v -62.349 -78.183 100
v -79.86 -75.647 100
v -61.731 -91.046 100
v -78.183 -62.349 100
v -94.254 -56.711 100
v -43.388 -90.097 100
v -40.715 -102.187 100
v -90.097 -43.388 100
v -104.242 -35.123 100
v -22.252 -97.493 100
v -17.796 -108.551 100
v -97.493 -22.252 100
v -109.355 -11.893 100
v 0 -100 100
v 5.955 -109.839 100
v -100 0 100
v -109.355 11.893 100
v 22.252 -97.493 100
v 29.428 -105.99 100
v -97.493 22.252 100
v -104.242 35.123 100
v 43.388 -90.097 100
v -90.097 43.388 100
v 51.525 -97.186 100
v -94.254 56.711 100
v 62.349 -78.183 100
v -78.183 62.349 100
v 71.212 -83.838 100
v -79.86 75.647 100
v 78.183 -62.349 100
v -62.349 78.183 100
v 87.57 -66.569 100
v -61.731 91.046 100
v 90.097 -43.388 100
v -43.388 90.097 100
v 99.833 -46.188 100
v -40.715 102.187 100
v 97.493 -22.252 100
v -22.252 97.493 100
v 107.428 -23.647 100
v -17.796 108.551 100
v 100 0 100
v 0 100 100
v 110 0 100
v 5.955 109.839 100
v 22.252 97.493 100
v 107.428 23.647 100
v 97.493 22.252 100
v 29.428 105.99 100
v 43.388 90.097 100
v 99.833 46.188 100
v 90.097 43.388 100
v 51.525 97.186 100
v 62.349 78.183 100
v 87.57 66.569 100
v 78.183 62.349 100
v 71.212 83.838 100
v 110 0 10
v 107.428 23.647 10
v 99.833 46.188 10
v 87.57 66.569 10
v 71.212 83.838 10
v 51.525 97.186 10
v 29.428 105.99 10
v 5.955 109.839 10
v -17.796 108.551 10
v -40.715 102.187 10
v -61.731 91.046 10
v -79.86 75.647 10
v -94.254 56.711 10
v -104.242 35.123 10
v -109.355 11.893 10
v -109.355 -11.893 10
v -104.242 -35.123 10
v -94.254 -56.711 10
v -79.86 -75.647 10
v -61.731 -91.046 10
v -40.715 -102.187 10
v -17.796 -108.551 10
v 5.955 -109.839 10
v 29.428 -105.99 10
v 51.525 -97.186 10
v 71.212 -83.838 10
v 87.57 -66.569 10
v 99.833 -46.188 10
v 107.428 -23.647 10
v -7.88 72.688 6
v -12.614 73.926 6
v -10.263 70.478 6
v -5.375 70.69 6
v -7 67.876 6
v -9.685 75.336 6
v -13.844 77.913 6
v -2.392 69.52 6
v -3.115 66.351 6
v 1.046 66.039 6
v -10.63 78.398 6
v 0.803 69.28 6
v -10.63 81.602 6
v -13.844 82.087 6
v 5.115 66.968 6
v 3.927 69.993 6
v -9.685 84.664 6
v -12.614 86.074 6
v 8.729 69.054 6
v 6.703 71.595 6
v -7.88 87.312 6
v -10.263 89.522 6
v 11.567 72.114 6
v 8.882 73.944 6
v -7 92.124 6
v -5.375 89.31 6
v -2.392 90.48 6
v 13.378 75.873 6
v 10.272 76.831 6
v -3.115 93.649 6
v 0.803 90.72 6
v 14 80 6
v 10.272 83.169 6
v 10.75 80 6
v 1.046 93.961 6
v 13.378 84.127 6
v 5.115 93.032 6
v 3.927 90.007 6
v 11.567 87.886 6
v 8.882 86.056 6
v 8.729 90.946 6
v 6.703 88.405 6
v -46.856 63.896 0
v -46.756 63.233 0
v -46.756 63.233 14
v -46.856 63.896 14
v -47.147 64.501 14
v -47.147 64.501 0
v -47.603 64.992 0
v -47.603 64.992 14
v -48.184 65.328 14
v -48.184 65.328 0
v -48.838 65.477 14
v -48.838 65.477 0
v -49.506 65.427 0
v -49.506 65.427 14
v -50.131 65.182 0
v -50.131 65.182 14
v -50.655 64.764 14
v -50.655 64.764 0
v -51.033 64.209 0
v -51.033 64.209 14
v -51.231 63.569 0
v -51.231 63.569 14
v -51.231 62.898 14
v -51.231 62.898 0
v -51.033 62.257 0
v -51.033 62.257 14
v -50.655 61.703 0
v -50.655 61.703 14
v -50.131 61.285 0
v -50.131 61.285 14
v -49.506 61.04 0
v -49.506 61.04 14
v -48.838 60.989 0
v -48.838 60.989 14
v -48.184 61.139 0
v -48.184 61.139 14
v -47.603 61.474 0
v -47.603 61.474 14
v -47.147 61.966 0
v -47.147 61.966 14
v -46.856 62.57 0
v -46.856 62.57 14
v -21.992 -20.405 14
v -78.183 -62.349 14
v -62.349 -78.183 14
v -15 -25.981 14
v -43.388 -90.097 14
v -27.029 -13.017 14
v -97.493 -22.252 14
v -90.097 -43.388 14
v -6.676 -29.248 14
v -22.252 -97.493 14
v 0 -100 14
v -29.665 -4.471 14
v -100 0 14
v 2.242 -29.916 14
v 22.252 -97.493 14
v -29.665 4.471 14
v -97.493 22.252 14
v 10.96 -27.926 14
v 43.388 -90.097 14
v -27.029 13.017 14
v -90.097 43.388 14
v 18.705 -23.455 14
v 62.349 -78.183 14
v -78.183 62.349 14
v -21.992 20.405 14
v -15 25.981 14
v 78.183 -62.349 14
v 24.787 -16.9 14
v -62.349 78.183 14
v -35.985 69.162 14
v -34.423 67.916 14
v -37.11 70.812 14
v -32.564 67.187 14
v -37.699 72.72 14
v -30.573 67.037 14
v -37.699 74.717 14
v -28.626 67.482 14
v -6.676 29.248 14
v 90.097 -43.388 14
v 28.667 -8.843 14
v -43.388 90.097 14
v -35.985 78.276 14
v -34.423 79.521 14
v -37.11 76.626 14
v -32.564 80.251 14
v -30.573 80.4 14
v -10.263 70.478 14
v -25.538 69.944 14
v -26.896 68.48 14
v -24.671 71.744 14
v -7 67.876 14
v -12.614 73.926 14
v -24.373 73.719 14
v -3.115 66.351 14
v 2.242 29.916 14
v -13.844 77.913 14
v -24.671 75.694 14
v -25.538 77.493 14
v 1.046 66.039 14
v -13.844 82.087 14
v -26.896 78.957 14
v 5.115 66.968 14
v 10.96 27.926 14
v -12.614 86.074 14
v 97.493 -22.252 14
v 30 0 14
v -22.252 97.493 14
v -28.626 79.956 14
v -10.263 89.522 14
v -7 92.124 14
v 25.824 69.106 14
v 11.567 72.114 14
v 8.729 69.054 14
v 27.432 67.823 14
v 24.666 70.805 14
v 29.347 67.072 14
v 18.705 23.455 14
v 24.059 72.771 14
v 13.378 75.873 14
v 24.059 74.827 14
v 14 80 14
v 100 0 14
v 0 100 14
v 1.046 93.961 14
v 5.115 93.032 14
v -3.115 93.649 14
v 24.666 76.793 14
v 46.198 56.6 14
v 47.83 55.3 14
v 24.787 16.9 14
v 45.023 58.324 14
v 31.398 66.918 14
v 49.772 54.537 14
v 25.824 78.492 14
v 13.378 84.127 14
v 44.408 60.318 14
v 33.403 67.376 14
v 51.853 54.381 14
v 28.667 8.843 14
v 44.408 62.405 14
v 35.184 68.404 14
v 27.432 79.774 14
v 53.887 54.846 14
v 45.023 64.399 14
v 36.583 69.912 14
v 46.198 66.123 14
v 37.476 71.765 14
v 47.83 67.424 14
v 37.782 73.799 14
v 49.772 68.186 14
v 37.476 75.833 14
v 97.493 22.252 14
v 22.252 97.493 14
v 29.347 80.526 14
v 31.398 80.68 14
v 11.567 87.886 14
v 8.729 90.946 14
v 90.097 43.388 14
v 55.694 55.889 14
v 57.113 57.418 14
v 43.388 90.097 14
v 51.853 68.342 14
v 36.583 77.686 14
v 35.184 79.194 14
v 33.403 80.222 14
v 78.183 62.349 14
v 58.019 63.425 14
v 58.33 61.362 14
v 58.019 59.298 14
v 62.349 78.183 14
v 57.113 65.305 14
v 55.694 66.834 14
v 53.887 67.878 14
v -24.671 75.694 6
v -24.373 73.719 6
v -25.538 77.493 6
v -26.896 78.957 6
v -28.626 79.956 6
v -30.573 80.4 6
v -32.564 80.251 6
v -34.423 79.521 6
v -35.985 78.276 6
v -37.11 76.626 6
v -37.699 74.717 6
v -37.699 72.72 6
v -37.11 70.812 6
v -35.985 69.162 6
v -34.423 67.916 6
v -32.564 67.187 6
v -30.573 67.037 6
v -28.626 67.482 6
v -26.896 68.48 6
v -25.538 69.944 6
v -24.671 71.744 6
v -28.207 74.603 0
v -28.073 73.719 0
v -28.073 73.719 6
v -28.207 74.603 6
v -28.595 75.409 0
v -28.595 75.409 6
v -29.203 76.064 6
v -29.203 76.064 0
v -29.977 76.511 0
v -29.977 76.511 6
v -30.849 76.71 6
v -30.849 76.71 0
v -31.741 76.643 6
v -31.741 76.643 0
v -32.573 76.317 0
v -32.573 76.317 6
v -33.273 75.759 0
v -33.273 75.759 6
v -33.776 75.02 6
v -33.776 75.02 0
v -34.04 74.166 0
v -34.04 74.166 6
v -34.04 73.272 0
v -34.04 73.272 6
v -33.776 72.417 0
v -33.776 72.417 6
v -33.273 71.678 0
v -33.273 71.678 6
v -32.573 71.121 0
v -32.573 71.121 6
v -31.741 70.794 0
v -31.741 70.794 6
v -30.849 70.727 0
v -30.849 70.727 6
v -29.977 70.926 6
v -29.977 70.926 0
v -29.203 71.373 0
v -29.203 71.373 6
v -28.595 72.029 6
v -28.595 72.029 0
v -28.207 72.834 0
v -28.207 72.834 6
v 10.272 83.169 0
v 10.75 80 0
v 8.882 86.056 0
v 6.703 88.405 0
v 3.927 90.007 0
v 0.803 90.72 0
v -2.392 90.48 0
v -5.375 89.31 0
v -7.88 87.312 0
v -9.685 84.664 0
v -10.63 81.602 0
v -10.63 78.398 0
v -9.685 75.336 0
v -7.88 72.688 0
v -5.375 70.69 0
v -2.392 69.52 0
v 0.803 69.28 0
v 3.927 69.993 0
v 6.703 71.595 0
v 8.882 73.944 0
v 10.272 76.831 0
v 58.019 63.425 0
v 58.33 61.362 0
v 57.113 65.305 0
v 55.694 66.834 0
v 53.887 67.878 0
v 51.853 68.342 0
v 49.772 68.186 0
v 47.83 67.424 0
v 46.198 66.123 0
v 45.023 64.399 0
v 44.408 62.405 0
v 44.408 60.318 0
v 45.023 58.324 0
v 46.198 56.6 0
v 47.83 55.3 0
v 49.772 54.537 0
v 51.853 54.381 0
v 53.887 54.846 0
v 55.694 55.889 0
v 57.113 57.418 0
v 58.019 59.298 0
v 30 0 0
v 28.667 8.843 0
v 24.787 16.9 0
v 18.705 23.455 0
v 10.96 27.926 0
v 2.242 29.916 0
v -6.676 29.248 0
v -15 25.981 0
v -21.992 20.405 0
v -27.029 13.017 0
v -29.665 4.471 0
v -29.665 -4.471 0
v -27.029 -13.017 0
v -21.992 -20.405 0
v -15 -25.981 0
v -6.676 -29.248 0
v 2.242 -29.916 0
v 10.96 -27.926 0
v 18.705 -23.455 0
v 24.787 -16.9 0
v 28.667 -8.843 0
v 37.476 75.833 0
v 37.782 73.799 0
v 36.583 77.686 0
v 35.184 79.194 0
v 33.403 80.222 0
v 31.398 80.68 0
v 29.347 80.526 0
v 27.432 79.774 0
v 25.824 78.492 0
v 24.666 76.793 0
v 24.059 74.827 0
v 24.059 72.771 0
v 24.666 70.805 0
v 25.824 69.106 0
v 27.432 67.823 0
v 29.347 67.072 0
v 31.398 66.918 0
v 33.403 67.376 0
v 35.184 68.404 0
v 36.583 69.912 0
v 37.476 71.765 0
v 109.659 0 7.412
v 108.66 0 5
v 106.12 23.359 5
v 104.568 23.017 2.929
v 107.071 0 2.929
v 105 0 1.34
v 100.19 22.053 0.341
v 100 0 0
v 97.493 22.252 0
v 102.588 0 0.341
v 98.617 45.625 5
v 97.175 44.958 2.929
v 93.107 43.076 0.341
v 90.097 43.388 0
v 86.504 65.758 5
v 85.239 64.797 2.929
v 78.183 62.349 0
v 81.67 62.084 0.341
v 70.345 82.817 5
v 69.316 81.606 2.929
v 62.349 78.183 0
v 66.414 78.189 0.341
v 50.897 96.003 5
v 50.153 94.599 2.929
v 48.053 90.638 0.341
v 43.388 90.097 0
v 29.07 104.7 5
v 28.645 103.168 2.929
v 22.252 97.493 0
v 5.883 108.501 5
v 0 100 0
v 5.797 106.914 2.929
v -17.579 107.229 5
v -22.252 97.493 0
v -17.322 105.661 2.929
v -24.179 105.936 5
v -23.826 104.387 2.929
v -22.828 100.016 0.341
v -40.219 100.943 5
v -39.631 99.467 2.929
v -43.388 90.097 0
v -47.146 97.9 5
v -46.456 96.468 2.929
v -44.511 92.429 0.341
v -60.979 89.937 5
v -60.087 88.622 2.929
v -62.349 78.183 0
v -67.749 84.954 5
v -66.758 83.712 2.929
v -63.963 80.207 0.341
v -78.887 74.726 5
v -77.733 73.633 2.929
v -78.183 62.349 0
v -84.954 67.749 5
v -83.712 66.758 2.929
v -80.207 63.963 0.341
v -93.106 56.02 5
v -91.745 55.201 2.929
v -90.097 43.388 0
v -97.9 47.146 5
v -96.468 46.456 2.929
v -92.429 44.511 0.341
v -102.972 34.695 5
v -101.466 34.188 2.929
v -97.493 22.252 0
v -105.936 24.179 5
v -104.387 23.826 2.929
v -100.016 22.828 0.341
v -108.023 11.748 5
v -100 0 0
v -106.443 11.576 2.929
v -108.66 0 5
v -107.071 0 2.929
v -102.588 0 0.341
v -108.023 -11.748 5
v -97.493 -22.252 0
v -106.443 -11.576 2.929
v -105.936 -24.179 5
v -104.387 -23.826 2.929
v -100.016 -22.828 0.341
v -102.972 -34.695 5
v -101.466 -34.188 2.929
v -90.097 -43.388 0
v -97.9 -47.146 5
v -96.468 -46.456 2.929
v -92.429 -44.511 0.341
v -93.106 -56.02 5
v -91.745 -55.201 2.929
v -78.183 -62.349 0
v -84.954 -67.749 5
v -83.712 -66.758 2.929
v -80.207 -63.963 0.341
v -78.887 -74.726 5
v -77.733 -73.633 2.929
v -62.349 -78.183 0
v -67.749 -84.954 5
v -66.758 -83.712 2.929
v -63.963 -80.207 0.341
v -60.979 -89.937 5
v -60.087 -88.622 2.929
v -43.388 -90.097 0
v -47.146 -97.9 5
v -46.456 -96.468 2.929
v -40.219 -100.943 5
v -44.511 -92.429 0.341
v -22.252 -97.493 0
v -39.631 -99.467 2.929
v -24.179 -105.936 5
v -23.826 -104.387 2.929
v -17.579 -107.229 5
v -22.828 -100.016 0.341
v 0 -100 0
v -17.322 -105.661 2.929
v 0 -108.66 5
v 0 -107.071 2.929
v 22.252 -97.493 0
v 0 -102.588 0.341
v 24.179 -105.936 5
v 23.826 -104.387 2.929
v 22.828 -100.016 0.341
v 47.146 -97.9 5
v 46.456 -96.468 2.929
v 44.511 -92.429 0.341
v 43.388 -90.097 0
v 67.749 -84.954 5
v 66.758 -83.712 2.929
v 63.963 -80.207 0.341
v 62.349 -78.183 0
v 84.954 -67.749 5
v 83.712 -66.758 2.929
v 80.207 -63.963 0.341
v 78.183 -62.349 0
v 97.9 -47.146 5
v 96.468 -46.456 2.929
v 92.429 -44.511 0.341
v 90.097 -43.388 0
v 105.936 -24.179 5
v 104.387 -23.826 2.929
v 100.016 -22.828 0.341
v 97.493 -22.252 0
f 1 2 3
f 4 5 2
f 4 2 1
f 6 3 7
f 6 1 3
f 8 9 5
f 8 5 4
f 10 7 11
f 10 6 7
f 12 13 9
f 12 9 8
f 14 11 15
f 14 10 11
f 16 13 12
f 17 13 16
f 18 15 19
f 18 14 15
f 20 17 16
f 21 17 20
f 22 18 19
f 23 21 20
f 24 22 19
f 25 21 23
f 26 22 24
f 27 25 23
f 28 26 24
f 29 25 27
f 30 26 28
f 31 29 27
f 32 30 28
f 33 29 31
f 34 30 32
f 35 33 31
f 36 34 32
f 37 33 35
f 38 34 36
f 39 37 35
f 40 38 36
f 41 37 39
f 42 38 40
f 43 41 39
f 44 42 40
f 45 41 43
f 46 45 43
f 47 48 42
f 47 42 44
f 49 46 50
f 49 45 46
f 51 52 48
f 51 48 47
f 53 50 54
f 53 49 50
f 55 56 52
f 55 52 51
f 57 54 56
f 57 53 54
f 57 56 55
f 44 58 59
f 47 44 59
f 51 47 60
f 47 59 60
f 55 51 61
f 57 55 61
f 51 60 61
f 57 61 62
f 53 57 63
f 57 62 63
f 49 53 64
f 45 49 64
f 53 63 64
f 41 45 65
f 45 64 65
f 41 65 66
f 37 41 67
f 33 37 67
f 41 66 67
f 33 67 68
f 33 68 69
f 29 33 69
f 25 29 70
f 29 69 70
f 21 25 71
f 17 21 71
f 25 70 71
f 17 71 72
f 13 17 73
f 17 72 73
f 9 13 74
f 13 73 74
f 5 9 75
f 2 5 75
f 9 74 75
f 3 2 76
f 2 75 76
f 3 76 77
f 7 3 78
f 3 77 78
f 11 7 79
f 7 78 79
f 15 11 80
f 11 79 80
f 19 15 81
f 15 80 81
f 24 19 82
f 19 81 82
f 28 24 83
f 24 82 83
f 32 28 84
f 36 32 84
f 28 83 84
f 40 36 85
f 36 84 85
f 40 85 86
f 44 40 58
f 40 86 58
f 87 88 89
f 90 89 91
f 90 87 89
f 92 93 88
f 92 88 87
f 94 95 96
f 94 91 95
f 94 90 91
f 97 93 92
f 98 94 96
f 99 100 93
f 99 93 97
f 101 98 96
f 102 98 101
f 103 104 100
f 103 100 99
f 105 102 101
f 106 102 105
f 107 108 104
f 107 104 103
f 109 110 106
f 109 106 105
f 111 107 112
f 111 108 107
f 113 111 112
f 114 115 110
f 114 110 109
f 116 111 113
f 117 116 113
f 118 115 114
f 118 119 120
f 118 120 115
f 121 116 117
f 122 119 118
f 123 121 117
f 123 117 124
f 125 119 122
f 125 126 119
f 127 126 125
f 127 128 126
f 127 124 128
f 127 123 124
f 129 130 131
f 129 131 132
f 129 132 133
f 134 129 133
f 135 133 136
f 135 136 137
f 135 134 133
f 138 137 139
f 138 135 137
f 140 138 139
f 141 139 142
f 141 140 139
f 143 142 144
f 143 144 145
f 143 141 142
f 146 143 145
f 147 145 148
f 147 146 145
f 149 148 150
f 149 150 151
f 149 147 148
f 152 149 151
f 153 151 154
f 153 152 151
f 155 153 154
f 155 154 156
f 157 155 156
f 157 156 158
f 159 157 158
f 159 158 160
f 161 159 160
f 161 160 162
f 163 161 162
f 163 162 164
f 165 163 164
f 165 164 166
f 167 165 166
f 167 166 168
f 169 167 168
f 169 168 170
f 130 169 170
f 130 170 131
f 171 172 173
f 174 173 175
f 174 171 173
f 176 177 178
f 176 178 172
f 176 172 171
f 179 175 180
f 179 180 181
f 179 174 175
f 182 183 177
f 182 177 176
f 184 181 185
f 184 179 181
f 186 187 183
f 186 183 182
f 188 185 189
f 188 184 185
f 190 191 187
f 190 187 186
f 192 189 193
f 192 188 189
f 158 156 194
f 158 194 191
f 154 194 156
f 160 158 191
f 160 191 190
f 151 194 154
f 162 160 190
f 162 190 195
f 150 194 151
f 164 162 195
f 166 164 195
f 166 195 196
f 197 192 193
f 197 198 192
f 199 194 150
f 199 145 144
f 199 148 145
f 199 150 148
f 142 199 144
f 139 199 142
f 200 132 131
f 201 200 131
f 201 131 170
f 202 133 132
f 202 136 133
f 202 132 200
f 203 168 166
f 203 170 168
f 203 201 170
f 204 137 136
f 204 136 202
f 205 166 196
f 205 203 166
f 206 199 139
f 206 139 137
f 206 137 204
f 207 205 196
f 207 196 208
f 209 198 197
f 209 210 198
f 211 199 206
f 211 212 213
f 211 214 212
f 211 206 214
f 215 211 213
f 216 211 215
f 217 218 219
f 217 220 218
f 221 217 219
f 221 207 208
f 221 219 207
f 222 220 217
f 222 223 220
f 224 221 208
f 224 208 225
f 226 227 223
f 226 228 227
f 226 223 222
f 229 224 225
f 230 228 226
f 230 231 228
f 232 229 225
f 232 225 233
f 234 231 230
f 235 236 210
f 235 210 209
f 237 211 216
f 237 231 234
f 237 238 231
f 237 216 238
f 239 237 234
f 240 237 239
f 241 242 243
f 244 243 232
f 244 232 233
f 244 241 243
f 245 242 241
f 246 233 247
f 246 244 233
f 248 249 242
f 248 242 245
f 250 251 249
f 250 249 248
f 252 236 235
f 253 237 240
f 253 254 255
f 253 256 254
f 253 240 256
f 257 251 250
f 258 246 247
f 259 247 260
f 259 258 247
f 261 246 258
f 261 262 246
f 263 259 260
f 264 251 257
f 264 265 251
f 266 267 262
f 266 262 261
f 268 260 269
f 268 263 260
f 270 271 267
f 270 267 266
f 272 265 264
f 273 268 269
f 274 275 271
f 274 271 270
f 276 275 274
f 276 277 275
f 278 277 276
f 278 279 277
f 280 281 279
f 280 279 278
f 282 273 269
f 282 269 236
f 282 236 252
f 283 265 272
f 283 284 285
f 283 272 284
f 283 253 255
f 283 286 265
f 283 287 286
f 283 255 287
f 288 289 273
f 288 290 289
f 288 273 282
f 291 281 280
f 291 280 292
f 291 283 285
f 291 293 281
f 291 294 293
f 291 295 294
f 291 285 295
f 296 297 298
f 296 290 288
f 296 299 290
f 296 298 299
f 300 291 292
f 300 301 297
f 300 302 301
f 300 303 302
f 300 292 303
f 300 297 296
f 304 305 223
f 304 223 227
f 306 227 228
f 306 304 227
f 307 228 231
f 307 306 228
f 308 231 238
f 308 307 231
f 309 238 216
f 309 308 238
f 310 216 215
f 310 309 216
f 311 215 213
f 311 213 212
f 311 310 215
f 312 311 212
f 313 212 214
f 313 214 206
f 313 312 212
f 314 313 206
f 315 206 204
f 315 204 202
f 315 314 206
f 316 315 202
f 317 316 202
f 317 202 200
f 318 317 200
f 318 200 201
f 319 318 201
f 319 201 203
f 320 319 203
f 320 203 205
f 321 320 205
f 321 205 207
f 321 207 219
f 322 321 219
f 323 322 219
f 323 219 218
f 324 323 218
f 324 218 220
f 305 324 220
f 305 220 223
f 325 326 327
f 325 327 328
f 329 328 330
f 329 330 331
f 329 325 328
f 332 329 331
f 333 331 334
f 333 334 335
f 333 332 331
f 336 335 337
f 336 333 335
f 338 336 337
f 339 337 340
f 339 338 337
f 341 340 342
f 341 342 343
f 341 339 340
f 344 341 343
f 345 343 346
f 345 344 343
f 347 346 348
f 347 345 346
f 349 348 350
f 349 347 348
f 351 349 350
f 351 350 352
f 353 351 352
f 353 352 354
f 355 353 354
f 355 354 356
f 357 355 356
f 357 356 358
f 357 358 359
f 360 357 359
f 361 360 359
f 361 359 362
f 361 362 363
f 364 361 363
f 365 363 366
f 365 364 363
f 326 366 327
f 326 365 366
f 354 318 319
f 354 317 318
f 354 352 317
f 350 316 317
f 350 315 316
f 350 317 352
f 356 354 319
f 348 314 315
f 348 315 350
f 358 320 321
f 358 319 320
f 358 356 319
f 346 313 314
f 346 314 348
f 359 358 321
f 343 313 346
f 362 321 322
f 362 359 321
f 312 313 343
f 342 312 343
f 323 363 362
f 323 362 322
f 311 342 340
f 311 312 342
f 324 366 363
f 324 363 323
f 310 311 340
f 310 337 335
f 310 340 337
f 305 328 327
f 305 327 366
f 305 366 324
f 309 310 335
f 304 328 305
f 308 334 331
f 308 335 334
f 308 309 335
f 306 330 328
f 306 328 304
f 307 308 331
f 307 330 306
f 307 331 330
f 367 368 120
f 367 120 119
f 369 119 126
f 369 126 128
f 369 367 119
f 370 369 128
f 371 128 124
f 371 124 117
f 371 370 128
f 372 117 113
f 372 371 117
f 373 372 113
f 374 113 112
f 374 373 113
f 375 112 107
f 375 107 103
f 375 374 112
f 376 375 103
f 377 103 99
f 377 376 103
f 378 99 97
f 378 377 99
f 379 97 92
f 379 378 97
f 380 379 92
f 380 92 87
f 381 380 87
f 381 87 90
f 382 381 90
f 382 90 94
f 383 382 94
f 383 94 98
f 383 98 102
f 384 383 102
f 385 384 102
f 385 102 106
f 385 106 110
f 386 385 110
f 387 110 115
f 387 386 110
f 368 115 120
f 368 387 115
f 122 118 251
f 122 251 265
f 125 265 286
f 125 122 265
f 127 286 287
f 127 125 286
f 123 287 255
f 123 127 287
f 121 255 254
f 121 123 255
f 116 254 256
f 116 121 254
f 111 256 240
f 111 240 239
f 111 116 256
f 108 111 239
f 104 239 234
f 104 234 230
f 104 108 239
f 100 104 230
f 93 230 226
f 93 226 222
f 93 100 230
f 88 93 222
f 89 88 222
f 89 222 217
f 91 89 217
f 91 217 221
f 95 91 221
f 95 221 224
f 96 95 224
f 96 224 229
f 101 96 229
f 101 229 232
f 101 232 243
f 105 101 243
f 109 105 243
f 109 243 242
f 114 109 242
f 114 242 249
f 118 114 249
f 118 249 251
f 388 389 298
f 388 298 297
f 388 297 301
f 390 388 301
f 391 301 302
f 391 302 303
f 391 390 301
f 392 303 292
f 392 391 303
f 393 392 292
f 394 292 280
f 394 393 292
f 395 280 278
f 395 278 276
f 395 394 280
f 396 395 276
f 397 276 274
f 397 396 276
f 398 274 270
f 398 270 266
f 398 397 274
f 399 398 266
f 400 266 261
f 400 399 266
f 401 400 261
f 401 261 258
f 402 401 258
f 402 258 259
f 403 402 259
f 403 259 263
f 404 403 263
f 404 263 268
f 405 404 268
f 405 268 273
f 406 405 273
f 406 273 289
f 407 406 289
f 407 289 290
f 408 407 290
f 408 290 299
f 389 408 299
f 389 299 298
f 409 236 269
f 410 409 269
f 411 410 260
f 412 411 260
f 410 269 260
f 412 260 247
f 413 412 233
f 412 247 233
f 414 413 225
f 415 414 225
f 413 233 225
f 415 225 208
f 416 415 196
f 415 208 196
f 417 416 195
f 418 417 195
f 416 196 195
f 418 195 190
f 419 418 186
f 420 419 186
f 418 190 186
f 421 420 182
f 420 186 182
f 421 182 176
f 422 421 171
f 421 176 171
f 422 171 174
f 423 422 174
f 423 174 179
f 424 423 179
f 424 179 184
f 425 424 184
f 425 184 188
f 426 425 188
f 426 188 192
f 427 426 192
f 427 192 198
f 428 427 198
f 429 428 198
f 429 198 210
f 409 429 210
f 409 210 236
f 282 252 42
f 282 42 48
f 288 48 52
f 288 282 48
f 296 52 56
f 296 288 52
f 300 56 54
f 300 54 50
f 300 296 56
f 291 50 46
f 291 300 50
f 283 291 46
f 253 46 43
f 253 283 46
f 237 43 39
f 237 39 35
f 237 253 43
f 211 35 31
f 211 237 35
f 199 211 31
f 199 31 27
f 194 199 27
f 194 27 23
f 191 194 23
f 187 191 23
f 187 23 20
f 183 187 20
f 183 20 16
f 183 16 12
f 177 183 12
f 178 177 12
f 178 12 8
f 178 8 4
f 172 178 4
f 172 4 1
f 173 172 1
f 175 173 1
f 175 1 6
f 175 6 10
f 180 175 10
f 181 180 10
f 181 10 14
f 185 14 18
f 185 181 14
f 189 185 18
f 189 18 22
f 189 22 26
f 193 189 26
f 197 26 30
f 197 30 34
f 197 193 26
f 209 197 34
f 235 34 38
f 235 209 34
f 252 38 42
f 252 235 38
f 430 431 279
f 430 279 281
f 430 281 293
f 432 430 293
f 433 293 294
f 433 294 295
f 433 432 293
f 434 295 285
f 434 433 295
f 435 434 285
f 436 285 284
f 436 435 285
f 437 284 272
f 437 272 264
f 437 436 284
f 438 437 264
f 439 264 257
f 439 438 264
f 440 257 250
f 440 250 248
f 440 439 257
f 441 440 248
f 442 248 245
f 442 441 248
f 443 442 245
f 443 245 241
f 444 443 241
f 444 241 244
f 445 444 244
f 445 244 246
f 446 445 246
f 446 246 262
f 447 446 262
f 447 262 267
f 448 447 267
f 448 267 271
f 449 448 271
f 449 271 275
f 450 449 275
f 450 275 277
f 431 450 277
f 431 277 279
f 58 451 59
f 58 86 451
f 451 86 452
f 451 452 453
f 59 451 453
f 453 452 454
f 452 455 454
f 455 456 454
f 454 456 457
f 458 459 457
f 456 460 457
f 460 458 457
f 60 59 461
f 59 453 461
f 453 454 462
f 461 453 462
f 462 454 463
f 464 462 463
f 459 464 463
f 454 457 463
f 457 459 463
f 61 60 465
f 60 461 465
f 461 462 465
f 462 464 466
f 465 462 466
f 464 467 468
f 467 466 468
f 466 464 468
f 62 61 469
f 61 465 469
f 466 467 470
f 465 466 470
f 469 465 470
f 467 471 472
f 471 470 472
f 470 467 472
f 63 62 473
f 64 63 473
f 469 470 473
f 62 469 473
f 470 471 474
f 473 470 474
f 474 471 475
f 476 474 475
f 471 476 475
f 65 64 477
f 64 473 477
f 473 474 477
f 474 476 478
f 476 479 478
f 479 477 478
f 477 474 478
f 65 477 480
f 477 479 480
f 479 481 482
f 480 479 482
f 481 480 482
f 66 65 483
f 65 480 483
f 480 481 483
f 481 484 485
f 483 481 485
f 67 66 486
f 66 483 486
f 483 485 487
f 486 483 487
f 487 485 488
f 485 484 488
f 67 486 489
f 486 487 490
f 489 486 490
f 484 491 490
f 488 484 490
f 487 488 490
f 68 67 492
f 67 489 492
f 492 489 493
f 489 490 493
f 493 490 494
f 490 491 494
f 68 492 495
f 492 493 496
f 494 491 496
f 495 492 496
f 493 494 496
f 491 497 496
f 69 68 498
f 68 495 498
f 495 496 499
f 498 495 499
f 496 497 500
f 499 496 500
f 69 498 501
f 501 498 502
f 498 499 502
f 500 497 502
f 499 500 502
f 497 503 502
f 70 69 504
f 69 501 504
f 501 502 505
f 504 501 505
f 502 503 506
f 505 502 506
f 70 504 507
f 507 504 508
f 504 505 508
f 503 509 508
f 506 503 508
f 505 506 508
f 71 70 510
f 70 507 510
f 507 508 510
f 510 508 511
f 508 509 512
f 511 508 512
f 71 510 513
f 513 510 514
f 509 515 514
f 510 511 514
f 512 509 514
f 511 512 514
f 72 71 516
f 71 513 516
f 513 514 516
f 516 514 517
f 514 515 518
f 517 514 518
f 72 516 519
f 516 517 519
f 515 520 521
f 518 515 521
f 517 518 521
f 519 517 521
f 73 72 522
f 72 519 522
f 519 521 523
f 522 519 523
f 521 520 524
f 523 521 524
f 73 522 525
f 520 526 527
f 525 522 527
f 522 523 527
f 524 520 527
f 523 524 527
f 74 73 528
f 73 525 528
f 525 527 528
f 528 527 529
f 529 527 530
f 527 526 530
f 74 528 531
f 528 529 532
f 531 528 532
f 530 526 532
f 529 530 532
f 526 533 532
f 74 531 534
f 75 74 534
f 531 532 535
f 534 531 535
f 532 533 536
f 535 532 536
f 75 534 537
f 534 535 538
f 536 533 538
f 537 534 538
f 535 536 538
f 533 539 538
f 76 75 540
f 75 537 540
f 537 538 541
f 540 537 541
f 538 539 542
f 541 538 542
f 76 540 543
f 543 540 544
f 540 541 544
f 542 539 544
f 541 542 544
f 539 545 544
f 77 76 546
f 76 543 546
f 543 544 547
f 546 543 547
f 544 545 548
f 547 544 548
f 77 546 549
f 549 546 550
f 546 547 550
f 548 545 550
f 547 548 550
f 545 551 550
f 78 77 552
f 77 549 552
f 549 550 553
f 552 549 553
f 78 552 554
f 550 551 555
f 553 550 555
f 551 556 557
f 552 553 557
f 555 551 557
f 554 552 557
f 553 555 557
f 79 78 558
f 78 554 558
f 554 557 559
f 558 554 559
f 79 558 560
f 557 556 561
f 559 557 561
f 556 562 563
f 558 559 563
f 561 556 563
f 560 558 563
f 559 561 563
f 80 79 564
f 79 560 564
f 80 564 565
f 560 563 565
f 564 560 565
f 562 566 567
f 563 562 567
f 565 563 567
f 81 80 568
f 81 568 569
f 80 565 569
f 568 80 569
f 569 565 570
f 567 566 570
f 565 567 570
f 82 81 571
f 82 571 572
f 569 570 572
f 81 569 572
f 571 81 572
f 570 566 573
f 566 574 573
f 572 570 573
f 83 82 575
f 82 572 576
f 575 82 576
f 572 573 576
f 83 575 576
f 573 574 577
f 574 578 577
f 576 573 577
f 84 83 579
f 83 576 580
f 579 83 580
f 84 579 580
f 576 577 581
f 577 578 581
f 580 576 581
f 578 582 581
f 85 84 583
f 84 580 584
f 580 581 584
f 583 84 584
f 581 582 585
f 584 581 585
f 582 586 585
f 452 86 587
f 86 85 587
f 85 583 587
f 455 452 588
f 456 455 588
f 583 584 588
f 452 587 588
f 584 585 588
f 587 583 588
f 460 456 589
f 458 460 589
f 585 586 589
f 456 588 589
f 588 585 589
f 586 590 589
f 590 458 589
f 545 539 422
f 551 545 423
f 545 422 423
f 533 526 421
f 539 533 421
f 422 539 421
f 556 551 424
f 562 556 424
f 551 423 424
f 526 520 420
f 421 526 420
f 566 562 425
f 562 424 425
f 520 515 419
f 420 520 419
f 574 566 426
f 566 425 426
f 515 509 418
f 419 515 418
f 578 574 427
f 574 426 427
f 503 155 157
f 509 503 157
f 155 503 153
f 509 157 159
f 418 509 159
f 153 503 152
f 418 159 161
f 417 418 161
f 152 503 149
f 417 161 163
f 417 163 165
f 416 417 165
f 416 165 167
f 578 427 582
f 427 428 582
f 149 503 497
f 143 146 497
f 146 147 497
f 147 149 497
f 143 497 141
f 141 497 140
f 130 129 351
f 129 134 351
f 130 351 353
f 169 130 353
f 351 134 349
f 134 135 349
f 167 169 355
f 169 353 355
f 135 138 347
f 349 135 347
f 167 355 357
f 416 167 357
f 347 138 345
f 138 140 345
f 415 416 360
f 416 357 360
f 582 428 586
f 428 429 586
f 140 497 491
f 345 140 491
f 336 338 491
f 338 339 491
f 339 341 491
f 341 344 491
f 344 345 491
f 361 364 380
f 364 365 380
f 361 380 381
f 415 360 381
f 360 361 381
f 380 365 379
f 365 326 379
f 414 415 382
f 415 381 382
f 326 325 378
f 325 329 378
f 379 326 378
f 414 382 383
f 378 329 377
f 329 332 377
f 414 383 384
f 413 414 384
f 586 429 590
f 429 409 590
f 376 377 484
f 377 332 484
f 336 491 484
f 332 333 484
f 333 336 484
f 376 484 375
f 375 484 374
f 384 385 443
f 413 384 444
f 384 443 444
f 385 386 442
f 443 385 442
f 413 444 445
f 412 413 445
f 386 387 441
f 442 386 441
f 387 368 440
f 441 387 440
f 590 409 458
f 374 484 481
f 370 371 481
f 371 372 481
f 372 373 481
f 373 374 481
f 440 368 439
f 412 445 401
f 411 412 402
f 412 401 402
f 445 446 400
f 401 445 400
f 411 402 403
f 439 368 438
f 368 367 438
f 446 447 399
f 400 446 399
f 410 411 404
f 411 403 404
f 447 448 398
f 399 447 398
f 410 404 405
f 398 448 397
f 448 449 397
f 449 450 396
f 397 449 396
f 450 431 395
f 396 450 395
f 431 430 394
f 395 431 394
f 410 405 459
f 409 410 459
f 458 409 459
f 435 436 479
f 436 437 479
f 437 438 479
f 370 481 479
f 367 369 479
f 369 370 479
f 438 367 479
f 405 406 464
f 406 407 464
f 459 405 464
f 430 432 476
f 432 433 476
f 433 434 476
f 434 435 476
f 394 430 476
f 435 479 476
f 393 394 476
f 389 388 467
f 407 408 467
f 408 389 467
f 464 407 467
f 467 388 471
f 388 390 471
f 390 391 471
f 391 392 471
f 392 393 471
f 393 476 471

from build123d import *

# Parameters (mm, degrees)
SKETCH1_R           = 100
SKETCH1_R_2         = 6.9
SKETCH1_R_3         = 10.75
SKETCH1_R_4         = 3
SKETCH1_R_5         = 2.25
SKETCH1_R_6         = 7
BOSS_EXTRUDE1_DEPTH = 6
SKETCH1_3_R         = 110
SKETCH1_3_R_2       = 100
BOSS_EXTRUDE2_DEPTH = 100
FILLET1_R           = 10
SKETCH1_11_R        = 100
SKETCH1_11_R_2      = 6.9
SKETCH1_11_R_3      = 7
SKETCH1_11_R_4      = 2.25
SKETCH1_11_R_5      = 6.7
SKETCH1_11_R_6      = 14
BOSS_EXTRUDE7_DEPTH = 14
SKETCH7_R           = 30
CUT_EXTRUDE3_DEPTH  = 110


with BuildPart() as part:
    # Sketch1 → Boss-Extrude1 (new body)
    with BuildSketch(Plane.XY):
        Circle(SKETCH1_R)
        with Locations((30.882391056, 73.798901907)):
            Circle(SKETCH1_R_2, mode=Mode.SUBTRACT)
        with Locations((0, 80)):
            Circle(SKETCH1_R_3, mode=Mode.SUBTRACT)
        with Locations((-31.073387423, 73.718685515)):
            Circle(SKETCH1_R_4, mode=Mode.SUBTRACT)
        with Locations((-49.00574775, 63.233192925)):
            Circle(SKETCH1_R_5, mode=Mode.SUBTRACT)
        with Locations((51.329760909, 61.361678962)):
            Circle(SKETCH1_R_6, mode=Mode.SUBTRACT)
    extrude(amount=BOSS_EXTRUDE1_DEPTH)

    # Sketch1<3> → Boss-Extrude2 (add)
    with BuildSketch(Plane.XY):
        Circle(SKETCH1_3_R)
        Circle(SKETCH1_3_R_2, mode=Mode.SUBTRACT)
    extrude(amount=BOSS_EXTRUDE2_DEPTH)

    # Fillet1
    fillet1_edges = [part.edges().sort_by_distance(p)[0] for p in [
        (-110, 0, 0),
    ]]
    fillet(fillet1_edges, radius=FILLET1_R)

    # Sketch1<11> → Boss-Extrude7 (add)
    with BuildSketch(Plane.XY):
        Circle(SKETCH1_11_R)
        with Locations((30.882391056, 73.798901907)):
            Circle(SKETCH1_11_R_2, mode=Mode.SUBTRACT)
        with Locations((51.329760909, 61.361678962)):
            Circle(SKETCH1_11_R_3, mode=Mode.SUBTRACT)
        with Locations((-49.00574775, 63.233192925)):
            Circle(SKETCH1_11_R_4, mode=Mode.SUBTRACT)
        with Locations((-31.073387423, 73.718685515)):
            Circle(SKETCH1_11_R_5, mode=Mode.SUBTRACT)
        with Locations((0, 80)):
            Circle(SKETCH1_11_R_6, mode=Mode.SUBTRACT)
    extrude(amount=BOSS_EXTRUDE7_DEPTH)

    # Sketch7 → Cut-Extrude3 (cut)
    with BuildSketch(Plane.XY.offset(14)):
        Circle(SKETCH7_R)
    extrude(amount=-CUT_EXTRUDE3_DEPTH, mode=Mode.SUBTRACT)


solid = part.part
